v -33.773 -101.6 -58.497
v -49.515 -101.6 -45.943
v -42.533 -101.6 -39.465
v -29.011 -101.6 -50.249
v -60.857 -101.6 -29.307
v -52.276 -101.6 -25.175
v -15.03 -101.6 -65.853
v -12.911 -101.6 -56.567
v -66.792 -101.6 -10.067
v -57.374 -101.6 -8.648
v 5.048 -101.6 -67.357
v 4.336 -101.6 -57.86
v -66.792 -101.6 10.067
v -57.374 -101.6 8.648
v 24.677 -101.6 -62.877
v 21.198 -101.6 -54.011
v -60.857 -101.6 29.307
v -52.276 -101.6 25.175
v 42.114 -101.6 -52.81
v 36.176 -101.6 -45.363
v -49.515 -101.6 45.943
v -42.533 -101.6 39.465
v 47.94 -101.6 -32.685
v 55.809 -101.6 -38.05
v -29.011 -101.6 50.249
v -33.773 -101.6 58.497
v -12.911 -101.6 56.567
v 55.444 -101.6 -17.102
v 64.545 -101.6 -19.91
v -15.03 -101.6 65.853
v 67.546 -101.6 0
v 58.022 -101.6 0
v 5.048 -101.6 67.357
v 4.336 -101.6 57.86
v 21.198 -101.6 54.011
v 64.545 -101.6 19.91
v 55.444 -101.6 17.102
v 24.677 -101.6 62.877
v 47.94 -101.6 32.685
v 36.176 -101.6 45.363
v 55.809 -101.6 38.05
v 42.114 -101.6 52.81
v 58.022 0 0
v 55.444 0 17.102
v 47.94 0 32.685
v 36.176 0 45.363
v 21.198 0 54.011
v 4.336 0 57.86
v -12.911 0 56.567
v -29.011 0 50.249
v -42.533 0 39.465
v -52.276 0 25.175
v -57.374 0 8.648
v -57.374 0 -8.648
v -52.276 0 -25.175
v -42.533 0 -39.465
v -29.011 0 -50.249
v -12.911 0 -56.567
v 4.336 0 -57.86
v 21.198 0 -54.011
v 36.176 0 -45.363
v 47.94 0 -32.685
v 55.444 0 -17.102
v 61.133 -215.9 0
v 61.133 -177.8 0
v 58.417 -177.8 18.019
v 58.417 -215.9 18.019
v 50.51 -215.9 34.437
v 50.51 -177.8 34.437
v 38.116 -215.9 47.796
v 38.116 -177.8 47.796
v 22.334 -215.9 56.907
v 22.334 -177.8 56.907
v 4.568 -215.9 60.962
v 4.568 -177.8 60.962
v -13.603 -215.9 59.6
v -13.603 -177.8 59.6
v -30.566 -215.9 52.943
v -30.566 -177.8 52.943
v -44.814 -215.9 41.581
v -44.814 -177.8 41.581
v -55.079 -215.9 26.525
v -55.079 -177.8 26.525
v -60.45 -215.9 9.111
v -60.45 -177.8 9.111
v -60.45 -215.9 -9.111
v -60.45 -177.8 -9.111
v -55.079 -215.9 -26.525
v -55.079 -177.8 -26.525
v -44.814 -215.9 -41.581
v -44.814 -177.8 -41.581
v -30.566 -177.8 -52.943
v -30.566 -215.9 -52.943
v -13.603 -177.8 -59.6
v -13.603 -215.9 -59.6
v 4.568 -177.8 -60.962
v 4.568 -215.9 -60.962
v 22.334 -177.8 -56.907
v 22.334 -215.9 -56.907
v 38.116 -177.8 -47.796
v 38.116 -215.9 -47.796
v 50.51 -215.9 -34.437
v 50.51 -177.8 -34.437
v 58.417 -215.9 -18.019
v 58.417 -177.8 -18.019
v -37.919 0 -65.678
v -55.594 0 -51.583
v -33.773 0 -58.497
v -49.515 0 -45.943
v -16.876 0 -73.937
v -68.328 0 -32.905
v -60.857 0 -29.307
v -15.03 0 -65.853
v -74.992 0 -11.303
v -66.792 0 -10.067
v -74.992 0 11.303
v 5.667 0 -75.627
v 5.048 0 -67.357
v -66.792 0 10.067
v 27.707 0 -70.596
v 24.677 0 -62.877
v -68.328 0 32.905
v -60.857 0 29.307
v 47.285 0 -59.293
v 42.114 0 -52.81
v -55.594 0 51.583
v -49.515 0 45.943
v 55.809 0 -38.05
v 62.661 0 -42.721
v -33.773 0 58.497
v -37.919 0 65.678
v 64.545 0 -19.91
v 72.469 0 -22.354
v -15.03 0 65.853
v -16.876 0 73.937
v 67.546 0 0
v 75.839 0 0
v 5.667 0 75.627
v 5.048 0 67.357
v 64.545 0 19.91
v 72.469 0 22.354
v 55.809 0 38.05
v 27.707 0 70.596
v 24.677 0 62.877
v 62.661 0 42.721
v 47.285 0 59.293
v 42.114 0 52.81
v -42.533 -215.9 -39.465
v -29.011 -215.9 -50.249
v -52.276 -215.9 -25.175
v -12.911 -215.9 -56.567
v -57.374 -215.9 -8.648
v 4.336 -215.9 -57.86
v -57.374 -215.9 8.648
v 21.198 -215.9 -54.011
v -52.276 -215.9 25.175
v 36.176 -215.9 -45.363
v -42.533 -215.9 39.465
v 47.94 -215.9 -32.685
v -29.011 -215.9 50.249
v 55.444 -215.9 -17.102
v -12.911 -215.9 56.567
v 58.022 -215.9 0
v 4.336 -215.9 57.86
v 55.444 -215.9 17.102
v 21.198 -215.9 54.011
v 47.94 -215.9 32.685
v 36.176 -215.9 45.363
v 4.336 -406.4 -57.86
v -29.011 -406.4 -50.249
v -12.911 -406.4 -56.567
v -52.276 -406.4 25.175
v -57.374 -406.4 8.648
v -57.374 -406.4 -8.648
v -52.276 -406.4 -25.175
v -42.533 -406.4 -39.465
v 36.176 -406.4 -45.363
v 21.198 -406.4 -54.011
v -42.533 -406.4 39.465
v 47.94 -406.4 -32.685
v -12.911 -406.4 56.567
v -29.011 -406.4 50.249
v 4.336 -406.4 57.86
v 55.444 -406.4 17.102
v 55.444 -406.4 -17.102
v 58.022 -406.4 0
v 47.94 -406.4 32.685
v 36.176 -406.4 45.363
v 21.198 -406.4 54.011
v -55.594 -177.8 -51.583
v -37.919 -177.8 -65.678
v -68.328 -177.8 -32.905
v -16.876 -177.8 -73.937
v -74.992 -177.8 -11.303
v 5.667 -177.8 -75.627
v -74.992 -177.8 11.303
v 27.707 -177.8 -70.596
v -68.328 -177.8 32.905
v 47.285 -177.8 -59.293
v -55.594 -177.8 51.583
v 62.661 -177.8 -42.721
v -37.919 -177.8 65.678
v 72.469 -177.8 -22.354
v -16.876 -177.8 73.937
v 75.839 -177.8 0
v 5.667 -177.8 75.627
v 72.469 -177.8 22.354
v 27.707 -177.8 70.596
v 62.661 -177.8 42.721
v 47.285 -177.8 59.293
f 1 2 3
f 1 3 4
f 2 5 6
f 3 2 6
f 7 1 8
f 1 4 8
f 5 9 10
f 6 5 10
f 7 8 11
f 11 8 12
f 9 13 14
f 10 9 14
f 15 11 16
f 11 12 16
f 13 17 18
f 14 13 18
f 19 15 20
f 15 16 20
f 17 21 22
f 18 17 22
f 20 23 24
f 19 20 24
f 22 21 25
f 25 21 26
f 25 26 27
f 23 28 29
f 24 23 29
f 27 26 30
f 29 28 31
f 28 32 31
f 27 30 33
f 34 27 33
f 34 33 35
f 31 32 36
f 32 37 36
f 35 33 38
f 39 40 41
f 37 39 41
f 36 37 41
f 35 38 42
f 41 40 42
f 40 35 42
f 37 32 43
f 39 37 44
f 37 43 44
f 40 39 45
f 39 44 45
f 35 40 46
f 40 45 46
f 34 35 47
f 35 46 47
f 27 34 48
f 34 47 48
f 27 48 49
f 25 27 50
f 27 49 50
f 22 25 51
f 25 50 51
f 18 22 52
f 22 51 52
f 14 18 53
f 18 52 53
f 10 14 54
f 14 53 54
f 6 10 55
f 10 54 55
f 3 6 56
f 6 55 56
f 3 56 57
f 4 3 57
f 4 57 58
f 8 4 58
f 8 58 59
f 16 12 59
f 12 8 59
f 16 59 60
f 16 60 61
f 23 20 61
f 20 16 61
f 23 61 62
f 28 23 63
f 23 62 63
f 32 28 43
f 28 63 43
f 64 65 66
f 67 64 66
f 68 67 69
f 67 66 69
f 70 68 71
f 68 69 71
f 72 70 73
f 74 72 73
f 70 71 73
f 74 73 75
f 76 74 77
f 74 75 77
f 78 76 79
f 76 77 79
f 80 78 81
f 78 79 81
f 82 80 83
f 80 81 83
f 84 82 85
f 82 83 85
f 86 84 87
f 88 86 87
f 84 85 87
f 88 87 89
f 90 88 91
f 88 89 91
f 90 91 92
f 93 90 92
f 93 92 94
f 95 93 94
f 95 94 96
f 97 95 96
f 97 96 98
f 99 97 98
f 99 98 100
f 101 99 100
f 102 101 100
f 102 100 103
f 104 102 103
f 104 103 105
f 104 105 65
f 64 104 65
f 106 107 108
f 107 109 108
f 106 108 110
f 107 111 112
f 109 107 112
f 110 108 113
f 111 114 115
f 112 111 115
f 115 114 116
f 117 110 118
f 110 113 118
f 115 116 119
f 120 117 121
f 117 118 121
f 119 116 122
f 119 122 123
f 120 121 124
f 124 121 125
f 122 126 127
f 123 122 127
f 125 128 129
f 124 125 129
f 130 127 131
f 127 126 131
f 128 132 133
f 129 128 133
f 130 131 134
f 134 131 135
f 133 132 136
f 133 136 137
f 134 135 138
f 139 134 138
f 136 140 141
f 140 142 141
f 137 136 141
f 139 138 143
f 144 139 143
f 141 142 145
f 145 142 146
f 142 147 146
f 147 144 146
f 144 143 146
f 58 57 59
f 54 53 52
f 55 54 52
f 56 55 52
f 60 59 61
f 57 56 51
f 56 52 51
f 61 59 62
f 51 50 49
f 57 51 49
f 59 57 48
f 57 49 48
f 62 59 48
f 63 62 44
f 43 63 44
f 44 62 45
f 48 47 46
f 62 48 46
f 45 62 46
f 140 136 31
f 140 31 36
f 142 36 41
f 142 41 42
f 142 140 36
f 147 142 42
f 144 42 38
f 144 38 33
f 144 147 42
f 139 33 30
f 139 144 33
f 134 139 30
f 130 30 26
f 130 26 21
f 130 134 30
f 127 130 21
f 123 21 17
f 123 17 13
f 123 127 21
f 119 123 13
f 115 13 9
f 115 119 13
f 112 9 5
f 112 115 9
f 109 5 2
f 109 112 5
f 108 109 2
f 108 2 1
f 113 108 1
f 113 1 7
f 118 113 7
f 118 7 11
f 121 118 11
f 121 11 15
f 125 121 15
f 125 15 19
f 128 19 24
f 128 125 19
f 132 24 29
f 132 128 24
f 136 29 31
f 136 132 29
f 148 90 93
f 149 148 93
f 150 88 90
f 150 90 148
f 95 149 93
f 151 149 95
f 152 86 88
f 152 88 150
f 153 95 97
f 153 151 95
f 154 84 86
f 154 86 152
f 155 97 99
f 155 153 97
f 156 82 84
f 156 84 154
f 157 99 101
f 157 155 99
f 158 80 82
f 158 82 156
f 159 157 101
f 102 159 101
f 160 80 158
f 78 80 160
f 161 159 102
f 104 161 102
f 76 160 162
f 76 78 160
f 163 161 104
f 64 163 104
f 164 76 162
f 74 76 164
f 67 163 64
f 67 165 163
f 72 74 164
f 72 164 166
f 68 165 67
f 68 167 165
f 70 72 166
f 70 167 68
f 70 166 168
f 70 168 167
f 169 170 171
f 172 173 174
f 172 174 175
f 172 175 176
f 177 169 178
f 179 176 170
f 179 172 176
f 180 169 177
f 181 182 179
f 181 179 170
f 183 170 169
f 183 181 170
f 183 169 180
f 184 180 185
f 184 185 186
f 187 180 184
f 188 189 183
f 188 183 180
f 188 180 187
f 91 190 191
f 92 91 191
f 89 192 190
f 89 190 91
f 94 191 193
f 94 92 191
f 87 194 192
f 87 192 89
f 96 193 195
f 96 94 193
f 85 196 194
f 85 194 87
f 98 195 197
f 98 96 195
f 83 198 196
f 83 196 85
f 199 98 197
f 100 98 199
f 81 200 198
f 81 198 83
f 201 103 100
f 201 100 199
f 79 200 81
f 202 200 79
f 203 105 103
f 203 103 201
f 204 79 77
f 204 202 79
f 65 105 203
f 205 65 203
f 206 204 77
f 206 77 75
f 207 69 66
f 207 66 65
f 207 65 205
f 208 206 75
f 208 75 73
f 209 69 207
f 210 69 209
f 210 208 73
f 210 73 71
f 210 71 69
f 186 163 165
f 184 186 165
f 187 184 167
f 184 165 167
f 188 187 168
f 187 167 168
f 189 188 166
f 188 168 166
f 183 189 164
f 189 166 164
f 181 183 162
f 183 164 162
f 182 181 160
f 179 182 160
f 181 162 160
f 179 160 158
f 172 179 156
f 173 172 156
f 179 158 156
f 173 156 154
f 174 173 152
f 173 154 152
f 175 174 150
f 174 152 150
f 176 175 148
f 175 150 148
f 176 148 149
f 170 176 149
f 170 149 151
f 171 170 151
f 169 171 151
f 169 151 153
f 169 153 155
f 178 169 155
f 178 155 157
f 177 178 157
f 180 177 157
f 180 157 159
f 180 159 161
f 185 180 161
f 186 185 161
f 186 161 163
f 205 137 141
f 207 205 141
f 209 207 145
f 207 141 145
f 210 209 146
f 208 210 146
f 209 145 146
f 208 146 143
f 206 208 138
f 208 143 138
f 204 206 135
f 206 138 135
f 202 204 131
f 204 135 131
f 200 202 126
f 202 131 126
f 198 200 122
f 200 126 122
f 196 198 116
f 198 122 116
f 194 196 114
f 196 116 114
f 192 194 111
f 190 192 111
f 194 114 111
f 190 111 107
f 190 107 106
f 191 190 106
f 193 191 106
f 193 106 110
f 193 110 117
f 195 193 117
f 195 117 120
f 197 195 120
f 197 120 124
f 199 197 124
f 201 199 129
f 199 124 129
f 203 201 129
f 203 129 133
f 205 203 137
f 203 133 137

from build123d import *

# Parameters (mm, degrees)
F0_R     = 75.838692
F1_DEPTH = 177.8
F2_R     = 61.132843
F4_DEPTH = 215.9
F3_R     = 17.420923
F5_DEPTH = 215.9
F6_R     = 67.546104
F7_DEPTH = 101.6
F8_R     = 58.022008
F9_DEPTH = 406.4


with BuildPart() as f1:
    # F0 (on Front) → F1 (new body)
    with BuildSketch(Plane.XZ):
        Circle(F0_R)
    extrude(amount=F1_DEPTH)

    # F2 (on Front) → F4 (join)
    with BuildSketch(Plane.XZ):
        Circle(F2_R)
    extrude(amount=F4_DEPTH)

    # F3 (on Front) → F5 (cut)
    with BuildSketch(Plane.XZ):
        Circle(F3_R)
    extrude(amount=F5_DEPTH, mode=Mode.SUBTRACT)

    # F6 (on Front) → F7 (cut)
    with BuildSketch(Plane.XZ):
        Circle(F6_R)
    extrude(amount=F7_DEPTH, mode=Mode.SUBTRACT)

    # F8 (on Front) → F9 (join)
    with BuildSketch(Plane.XZ):
        Circle(F8_R)
    extrude(amount=F9_DEPTH)


solid = f1.part
